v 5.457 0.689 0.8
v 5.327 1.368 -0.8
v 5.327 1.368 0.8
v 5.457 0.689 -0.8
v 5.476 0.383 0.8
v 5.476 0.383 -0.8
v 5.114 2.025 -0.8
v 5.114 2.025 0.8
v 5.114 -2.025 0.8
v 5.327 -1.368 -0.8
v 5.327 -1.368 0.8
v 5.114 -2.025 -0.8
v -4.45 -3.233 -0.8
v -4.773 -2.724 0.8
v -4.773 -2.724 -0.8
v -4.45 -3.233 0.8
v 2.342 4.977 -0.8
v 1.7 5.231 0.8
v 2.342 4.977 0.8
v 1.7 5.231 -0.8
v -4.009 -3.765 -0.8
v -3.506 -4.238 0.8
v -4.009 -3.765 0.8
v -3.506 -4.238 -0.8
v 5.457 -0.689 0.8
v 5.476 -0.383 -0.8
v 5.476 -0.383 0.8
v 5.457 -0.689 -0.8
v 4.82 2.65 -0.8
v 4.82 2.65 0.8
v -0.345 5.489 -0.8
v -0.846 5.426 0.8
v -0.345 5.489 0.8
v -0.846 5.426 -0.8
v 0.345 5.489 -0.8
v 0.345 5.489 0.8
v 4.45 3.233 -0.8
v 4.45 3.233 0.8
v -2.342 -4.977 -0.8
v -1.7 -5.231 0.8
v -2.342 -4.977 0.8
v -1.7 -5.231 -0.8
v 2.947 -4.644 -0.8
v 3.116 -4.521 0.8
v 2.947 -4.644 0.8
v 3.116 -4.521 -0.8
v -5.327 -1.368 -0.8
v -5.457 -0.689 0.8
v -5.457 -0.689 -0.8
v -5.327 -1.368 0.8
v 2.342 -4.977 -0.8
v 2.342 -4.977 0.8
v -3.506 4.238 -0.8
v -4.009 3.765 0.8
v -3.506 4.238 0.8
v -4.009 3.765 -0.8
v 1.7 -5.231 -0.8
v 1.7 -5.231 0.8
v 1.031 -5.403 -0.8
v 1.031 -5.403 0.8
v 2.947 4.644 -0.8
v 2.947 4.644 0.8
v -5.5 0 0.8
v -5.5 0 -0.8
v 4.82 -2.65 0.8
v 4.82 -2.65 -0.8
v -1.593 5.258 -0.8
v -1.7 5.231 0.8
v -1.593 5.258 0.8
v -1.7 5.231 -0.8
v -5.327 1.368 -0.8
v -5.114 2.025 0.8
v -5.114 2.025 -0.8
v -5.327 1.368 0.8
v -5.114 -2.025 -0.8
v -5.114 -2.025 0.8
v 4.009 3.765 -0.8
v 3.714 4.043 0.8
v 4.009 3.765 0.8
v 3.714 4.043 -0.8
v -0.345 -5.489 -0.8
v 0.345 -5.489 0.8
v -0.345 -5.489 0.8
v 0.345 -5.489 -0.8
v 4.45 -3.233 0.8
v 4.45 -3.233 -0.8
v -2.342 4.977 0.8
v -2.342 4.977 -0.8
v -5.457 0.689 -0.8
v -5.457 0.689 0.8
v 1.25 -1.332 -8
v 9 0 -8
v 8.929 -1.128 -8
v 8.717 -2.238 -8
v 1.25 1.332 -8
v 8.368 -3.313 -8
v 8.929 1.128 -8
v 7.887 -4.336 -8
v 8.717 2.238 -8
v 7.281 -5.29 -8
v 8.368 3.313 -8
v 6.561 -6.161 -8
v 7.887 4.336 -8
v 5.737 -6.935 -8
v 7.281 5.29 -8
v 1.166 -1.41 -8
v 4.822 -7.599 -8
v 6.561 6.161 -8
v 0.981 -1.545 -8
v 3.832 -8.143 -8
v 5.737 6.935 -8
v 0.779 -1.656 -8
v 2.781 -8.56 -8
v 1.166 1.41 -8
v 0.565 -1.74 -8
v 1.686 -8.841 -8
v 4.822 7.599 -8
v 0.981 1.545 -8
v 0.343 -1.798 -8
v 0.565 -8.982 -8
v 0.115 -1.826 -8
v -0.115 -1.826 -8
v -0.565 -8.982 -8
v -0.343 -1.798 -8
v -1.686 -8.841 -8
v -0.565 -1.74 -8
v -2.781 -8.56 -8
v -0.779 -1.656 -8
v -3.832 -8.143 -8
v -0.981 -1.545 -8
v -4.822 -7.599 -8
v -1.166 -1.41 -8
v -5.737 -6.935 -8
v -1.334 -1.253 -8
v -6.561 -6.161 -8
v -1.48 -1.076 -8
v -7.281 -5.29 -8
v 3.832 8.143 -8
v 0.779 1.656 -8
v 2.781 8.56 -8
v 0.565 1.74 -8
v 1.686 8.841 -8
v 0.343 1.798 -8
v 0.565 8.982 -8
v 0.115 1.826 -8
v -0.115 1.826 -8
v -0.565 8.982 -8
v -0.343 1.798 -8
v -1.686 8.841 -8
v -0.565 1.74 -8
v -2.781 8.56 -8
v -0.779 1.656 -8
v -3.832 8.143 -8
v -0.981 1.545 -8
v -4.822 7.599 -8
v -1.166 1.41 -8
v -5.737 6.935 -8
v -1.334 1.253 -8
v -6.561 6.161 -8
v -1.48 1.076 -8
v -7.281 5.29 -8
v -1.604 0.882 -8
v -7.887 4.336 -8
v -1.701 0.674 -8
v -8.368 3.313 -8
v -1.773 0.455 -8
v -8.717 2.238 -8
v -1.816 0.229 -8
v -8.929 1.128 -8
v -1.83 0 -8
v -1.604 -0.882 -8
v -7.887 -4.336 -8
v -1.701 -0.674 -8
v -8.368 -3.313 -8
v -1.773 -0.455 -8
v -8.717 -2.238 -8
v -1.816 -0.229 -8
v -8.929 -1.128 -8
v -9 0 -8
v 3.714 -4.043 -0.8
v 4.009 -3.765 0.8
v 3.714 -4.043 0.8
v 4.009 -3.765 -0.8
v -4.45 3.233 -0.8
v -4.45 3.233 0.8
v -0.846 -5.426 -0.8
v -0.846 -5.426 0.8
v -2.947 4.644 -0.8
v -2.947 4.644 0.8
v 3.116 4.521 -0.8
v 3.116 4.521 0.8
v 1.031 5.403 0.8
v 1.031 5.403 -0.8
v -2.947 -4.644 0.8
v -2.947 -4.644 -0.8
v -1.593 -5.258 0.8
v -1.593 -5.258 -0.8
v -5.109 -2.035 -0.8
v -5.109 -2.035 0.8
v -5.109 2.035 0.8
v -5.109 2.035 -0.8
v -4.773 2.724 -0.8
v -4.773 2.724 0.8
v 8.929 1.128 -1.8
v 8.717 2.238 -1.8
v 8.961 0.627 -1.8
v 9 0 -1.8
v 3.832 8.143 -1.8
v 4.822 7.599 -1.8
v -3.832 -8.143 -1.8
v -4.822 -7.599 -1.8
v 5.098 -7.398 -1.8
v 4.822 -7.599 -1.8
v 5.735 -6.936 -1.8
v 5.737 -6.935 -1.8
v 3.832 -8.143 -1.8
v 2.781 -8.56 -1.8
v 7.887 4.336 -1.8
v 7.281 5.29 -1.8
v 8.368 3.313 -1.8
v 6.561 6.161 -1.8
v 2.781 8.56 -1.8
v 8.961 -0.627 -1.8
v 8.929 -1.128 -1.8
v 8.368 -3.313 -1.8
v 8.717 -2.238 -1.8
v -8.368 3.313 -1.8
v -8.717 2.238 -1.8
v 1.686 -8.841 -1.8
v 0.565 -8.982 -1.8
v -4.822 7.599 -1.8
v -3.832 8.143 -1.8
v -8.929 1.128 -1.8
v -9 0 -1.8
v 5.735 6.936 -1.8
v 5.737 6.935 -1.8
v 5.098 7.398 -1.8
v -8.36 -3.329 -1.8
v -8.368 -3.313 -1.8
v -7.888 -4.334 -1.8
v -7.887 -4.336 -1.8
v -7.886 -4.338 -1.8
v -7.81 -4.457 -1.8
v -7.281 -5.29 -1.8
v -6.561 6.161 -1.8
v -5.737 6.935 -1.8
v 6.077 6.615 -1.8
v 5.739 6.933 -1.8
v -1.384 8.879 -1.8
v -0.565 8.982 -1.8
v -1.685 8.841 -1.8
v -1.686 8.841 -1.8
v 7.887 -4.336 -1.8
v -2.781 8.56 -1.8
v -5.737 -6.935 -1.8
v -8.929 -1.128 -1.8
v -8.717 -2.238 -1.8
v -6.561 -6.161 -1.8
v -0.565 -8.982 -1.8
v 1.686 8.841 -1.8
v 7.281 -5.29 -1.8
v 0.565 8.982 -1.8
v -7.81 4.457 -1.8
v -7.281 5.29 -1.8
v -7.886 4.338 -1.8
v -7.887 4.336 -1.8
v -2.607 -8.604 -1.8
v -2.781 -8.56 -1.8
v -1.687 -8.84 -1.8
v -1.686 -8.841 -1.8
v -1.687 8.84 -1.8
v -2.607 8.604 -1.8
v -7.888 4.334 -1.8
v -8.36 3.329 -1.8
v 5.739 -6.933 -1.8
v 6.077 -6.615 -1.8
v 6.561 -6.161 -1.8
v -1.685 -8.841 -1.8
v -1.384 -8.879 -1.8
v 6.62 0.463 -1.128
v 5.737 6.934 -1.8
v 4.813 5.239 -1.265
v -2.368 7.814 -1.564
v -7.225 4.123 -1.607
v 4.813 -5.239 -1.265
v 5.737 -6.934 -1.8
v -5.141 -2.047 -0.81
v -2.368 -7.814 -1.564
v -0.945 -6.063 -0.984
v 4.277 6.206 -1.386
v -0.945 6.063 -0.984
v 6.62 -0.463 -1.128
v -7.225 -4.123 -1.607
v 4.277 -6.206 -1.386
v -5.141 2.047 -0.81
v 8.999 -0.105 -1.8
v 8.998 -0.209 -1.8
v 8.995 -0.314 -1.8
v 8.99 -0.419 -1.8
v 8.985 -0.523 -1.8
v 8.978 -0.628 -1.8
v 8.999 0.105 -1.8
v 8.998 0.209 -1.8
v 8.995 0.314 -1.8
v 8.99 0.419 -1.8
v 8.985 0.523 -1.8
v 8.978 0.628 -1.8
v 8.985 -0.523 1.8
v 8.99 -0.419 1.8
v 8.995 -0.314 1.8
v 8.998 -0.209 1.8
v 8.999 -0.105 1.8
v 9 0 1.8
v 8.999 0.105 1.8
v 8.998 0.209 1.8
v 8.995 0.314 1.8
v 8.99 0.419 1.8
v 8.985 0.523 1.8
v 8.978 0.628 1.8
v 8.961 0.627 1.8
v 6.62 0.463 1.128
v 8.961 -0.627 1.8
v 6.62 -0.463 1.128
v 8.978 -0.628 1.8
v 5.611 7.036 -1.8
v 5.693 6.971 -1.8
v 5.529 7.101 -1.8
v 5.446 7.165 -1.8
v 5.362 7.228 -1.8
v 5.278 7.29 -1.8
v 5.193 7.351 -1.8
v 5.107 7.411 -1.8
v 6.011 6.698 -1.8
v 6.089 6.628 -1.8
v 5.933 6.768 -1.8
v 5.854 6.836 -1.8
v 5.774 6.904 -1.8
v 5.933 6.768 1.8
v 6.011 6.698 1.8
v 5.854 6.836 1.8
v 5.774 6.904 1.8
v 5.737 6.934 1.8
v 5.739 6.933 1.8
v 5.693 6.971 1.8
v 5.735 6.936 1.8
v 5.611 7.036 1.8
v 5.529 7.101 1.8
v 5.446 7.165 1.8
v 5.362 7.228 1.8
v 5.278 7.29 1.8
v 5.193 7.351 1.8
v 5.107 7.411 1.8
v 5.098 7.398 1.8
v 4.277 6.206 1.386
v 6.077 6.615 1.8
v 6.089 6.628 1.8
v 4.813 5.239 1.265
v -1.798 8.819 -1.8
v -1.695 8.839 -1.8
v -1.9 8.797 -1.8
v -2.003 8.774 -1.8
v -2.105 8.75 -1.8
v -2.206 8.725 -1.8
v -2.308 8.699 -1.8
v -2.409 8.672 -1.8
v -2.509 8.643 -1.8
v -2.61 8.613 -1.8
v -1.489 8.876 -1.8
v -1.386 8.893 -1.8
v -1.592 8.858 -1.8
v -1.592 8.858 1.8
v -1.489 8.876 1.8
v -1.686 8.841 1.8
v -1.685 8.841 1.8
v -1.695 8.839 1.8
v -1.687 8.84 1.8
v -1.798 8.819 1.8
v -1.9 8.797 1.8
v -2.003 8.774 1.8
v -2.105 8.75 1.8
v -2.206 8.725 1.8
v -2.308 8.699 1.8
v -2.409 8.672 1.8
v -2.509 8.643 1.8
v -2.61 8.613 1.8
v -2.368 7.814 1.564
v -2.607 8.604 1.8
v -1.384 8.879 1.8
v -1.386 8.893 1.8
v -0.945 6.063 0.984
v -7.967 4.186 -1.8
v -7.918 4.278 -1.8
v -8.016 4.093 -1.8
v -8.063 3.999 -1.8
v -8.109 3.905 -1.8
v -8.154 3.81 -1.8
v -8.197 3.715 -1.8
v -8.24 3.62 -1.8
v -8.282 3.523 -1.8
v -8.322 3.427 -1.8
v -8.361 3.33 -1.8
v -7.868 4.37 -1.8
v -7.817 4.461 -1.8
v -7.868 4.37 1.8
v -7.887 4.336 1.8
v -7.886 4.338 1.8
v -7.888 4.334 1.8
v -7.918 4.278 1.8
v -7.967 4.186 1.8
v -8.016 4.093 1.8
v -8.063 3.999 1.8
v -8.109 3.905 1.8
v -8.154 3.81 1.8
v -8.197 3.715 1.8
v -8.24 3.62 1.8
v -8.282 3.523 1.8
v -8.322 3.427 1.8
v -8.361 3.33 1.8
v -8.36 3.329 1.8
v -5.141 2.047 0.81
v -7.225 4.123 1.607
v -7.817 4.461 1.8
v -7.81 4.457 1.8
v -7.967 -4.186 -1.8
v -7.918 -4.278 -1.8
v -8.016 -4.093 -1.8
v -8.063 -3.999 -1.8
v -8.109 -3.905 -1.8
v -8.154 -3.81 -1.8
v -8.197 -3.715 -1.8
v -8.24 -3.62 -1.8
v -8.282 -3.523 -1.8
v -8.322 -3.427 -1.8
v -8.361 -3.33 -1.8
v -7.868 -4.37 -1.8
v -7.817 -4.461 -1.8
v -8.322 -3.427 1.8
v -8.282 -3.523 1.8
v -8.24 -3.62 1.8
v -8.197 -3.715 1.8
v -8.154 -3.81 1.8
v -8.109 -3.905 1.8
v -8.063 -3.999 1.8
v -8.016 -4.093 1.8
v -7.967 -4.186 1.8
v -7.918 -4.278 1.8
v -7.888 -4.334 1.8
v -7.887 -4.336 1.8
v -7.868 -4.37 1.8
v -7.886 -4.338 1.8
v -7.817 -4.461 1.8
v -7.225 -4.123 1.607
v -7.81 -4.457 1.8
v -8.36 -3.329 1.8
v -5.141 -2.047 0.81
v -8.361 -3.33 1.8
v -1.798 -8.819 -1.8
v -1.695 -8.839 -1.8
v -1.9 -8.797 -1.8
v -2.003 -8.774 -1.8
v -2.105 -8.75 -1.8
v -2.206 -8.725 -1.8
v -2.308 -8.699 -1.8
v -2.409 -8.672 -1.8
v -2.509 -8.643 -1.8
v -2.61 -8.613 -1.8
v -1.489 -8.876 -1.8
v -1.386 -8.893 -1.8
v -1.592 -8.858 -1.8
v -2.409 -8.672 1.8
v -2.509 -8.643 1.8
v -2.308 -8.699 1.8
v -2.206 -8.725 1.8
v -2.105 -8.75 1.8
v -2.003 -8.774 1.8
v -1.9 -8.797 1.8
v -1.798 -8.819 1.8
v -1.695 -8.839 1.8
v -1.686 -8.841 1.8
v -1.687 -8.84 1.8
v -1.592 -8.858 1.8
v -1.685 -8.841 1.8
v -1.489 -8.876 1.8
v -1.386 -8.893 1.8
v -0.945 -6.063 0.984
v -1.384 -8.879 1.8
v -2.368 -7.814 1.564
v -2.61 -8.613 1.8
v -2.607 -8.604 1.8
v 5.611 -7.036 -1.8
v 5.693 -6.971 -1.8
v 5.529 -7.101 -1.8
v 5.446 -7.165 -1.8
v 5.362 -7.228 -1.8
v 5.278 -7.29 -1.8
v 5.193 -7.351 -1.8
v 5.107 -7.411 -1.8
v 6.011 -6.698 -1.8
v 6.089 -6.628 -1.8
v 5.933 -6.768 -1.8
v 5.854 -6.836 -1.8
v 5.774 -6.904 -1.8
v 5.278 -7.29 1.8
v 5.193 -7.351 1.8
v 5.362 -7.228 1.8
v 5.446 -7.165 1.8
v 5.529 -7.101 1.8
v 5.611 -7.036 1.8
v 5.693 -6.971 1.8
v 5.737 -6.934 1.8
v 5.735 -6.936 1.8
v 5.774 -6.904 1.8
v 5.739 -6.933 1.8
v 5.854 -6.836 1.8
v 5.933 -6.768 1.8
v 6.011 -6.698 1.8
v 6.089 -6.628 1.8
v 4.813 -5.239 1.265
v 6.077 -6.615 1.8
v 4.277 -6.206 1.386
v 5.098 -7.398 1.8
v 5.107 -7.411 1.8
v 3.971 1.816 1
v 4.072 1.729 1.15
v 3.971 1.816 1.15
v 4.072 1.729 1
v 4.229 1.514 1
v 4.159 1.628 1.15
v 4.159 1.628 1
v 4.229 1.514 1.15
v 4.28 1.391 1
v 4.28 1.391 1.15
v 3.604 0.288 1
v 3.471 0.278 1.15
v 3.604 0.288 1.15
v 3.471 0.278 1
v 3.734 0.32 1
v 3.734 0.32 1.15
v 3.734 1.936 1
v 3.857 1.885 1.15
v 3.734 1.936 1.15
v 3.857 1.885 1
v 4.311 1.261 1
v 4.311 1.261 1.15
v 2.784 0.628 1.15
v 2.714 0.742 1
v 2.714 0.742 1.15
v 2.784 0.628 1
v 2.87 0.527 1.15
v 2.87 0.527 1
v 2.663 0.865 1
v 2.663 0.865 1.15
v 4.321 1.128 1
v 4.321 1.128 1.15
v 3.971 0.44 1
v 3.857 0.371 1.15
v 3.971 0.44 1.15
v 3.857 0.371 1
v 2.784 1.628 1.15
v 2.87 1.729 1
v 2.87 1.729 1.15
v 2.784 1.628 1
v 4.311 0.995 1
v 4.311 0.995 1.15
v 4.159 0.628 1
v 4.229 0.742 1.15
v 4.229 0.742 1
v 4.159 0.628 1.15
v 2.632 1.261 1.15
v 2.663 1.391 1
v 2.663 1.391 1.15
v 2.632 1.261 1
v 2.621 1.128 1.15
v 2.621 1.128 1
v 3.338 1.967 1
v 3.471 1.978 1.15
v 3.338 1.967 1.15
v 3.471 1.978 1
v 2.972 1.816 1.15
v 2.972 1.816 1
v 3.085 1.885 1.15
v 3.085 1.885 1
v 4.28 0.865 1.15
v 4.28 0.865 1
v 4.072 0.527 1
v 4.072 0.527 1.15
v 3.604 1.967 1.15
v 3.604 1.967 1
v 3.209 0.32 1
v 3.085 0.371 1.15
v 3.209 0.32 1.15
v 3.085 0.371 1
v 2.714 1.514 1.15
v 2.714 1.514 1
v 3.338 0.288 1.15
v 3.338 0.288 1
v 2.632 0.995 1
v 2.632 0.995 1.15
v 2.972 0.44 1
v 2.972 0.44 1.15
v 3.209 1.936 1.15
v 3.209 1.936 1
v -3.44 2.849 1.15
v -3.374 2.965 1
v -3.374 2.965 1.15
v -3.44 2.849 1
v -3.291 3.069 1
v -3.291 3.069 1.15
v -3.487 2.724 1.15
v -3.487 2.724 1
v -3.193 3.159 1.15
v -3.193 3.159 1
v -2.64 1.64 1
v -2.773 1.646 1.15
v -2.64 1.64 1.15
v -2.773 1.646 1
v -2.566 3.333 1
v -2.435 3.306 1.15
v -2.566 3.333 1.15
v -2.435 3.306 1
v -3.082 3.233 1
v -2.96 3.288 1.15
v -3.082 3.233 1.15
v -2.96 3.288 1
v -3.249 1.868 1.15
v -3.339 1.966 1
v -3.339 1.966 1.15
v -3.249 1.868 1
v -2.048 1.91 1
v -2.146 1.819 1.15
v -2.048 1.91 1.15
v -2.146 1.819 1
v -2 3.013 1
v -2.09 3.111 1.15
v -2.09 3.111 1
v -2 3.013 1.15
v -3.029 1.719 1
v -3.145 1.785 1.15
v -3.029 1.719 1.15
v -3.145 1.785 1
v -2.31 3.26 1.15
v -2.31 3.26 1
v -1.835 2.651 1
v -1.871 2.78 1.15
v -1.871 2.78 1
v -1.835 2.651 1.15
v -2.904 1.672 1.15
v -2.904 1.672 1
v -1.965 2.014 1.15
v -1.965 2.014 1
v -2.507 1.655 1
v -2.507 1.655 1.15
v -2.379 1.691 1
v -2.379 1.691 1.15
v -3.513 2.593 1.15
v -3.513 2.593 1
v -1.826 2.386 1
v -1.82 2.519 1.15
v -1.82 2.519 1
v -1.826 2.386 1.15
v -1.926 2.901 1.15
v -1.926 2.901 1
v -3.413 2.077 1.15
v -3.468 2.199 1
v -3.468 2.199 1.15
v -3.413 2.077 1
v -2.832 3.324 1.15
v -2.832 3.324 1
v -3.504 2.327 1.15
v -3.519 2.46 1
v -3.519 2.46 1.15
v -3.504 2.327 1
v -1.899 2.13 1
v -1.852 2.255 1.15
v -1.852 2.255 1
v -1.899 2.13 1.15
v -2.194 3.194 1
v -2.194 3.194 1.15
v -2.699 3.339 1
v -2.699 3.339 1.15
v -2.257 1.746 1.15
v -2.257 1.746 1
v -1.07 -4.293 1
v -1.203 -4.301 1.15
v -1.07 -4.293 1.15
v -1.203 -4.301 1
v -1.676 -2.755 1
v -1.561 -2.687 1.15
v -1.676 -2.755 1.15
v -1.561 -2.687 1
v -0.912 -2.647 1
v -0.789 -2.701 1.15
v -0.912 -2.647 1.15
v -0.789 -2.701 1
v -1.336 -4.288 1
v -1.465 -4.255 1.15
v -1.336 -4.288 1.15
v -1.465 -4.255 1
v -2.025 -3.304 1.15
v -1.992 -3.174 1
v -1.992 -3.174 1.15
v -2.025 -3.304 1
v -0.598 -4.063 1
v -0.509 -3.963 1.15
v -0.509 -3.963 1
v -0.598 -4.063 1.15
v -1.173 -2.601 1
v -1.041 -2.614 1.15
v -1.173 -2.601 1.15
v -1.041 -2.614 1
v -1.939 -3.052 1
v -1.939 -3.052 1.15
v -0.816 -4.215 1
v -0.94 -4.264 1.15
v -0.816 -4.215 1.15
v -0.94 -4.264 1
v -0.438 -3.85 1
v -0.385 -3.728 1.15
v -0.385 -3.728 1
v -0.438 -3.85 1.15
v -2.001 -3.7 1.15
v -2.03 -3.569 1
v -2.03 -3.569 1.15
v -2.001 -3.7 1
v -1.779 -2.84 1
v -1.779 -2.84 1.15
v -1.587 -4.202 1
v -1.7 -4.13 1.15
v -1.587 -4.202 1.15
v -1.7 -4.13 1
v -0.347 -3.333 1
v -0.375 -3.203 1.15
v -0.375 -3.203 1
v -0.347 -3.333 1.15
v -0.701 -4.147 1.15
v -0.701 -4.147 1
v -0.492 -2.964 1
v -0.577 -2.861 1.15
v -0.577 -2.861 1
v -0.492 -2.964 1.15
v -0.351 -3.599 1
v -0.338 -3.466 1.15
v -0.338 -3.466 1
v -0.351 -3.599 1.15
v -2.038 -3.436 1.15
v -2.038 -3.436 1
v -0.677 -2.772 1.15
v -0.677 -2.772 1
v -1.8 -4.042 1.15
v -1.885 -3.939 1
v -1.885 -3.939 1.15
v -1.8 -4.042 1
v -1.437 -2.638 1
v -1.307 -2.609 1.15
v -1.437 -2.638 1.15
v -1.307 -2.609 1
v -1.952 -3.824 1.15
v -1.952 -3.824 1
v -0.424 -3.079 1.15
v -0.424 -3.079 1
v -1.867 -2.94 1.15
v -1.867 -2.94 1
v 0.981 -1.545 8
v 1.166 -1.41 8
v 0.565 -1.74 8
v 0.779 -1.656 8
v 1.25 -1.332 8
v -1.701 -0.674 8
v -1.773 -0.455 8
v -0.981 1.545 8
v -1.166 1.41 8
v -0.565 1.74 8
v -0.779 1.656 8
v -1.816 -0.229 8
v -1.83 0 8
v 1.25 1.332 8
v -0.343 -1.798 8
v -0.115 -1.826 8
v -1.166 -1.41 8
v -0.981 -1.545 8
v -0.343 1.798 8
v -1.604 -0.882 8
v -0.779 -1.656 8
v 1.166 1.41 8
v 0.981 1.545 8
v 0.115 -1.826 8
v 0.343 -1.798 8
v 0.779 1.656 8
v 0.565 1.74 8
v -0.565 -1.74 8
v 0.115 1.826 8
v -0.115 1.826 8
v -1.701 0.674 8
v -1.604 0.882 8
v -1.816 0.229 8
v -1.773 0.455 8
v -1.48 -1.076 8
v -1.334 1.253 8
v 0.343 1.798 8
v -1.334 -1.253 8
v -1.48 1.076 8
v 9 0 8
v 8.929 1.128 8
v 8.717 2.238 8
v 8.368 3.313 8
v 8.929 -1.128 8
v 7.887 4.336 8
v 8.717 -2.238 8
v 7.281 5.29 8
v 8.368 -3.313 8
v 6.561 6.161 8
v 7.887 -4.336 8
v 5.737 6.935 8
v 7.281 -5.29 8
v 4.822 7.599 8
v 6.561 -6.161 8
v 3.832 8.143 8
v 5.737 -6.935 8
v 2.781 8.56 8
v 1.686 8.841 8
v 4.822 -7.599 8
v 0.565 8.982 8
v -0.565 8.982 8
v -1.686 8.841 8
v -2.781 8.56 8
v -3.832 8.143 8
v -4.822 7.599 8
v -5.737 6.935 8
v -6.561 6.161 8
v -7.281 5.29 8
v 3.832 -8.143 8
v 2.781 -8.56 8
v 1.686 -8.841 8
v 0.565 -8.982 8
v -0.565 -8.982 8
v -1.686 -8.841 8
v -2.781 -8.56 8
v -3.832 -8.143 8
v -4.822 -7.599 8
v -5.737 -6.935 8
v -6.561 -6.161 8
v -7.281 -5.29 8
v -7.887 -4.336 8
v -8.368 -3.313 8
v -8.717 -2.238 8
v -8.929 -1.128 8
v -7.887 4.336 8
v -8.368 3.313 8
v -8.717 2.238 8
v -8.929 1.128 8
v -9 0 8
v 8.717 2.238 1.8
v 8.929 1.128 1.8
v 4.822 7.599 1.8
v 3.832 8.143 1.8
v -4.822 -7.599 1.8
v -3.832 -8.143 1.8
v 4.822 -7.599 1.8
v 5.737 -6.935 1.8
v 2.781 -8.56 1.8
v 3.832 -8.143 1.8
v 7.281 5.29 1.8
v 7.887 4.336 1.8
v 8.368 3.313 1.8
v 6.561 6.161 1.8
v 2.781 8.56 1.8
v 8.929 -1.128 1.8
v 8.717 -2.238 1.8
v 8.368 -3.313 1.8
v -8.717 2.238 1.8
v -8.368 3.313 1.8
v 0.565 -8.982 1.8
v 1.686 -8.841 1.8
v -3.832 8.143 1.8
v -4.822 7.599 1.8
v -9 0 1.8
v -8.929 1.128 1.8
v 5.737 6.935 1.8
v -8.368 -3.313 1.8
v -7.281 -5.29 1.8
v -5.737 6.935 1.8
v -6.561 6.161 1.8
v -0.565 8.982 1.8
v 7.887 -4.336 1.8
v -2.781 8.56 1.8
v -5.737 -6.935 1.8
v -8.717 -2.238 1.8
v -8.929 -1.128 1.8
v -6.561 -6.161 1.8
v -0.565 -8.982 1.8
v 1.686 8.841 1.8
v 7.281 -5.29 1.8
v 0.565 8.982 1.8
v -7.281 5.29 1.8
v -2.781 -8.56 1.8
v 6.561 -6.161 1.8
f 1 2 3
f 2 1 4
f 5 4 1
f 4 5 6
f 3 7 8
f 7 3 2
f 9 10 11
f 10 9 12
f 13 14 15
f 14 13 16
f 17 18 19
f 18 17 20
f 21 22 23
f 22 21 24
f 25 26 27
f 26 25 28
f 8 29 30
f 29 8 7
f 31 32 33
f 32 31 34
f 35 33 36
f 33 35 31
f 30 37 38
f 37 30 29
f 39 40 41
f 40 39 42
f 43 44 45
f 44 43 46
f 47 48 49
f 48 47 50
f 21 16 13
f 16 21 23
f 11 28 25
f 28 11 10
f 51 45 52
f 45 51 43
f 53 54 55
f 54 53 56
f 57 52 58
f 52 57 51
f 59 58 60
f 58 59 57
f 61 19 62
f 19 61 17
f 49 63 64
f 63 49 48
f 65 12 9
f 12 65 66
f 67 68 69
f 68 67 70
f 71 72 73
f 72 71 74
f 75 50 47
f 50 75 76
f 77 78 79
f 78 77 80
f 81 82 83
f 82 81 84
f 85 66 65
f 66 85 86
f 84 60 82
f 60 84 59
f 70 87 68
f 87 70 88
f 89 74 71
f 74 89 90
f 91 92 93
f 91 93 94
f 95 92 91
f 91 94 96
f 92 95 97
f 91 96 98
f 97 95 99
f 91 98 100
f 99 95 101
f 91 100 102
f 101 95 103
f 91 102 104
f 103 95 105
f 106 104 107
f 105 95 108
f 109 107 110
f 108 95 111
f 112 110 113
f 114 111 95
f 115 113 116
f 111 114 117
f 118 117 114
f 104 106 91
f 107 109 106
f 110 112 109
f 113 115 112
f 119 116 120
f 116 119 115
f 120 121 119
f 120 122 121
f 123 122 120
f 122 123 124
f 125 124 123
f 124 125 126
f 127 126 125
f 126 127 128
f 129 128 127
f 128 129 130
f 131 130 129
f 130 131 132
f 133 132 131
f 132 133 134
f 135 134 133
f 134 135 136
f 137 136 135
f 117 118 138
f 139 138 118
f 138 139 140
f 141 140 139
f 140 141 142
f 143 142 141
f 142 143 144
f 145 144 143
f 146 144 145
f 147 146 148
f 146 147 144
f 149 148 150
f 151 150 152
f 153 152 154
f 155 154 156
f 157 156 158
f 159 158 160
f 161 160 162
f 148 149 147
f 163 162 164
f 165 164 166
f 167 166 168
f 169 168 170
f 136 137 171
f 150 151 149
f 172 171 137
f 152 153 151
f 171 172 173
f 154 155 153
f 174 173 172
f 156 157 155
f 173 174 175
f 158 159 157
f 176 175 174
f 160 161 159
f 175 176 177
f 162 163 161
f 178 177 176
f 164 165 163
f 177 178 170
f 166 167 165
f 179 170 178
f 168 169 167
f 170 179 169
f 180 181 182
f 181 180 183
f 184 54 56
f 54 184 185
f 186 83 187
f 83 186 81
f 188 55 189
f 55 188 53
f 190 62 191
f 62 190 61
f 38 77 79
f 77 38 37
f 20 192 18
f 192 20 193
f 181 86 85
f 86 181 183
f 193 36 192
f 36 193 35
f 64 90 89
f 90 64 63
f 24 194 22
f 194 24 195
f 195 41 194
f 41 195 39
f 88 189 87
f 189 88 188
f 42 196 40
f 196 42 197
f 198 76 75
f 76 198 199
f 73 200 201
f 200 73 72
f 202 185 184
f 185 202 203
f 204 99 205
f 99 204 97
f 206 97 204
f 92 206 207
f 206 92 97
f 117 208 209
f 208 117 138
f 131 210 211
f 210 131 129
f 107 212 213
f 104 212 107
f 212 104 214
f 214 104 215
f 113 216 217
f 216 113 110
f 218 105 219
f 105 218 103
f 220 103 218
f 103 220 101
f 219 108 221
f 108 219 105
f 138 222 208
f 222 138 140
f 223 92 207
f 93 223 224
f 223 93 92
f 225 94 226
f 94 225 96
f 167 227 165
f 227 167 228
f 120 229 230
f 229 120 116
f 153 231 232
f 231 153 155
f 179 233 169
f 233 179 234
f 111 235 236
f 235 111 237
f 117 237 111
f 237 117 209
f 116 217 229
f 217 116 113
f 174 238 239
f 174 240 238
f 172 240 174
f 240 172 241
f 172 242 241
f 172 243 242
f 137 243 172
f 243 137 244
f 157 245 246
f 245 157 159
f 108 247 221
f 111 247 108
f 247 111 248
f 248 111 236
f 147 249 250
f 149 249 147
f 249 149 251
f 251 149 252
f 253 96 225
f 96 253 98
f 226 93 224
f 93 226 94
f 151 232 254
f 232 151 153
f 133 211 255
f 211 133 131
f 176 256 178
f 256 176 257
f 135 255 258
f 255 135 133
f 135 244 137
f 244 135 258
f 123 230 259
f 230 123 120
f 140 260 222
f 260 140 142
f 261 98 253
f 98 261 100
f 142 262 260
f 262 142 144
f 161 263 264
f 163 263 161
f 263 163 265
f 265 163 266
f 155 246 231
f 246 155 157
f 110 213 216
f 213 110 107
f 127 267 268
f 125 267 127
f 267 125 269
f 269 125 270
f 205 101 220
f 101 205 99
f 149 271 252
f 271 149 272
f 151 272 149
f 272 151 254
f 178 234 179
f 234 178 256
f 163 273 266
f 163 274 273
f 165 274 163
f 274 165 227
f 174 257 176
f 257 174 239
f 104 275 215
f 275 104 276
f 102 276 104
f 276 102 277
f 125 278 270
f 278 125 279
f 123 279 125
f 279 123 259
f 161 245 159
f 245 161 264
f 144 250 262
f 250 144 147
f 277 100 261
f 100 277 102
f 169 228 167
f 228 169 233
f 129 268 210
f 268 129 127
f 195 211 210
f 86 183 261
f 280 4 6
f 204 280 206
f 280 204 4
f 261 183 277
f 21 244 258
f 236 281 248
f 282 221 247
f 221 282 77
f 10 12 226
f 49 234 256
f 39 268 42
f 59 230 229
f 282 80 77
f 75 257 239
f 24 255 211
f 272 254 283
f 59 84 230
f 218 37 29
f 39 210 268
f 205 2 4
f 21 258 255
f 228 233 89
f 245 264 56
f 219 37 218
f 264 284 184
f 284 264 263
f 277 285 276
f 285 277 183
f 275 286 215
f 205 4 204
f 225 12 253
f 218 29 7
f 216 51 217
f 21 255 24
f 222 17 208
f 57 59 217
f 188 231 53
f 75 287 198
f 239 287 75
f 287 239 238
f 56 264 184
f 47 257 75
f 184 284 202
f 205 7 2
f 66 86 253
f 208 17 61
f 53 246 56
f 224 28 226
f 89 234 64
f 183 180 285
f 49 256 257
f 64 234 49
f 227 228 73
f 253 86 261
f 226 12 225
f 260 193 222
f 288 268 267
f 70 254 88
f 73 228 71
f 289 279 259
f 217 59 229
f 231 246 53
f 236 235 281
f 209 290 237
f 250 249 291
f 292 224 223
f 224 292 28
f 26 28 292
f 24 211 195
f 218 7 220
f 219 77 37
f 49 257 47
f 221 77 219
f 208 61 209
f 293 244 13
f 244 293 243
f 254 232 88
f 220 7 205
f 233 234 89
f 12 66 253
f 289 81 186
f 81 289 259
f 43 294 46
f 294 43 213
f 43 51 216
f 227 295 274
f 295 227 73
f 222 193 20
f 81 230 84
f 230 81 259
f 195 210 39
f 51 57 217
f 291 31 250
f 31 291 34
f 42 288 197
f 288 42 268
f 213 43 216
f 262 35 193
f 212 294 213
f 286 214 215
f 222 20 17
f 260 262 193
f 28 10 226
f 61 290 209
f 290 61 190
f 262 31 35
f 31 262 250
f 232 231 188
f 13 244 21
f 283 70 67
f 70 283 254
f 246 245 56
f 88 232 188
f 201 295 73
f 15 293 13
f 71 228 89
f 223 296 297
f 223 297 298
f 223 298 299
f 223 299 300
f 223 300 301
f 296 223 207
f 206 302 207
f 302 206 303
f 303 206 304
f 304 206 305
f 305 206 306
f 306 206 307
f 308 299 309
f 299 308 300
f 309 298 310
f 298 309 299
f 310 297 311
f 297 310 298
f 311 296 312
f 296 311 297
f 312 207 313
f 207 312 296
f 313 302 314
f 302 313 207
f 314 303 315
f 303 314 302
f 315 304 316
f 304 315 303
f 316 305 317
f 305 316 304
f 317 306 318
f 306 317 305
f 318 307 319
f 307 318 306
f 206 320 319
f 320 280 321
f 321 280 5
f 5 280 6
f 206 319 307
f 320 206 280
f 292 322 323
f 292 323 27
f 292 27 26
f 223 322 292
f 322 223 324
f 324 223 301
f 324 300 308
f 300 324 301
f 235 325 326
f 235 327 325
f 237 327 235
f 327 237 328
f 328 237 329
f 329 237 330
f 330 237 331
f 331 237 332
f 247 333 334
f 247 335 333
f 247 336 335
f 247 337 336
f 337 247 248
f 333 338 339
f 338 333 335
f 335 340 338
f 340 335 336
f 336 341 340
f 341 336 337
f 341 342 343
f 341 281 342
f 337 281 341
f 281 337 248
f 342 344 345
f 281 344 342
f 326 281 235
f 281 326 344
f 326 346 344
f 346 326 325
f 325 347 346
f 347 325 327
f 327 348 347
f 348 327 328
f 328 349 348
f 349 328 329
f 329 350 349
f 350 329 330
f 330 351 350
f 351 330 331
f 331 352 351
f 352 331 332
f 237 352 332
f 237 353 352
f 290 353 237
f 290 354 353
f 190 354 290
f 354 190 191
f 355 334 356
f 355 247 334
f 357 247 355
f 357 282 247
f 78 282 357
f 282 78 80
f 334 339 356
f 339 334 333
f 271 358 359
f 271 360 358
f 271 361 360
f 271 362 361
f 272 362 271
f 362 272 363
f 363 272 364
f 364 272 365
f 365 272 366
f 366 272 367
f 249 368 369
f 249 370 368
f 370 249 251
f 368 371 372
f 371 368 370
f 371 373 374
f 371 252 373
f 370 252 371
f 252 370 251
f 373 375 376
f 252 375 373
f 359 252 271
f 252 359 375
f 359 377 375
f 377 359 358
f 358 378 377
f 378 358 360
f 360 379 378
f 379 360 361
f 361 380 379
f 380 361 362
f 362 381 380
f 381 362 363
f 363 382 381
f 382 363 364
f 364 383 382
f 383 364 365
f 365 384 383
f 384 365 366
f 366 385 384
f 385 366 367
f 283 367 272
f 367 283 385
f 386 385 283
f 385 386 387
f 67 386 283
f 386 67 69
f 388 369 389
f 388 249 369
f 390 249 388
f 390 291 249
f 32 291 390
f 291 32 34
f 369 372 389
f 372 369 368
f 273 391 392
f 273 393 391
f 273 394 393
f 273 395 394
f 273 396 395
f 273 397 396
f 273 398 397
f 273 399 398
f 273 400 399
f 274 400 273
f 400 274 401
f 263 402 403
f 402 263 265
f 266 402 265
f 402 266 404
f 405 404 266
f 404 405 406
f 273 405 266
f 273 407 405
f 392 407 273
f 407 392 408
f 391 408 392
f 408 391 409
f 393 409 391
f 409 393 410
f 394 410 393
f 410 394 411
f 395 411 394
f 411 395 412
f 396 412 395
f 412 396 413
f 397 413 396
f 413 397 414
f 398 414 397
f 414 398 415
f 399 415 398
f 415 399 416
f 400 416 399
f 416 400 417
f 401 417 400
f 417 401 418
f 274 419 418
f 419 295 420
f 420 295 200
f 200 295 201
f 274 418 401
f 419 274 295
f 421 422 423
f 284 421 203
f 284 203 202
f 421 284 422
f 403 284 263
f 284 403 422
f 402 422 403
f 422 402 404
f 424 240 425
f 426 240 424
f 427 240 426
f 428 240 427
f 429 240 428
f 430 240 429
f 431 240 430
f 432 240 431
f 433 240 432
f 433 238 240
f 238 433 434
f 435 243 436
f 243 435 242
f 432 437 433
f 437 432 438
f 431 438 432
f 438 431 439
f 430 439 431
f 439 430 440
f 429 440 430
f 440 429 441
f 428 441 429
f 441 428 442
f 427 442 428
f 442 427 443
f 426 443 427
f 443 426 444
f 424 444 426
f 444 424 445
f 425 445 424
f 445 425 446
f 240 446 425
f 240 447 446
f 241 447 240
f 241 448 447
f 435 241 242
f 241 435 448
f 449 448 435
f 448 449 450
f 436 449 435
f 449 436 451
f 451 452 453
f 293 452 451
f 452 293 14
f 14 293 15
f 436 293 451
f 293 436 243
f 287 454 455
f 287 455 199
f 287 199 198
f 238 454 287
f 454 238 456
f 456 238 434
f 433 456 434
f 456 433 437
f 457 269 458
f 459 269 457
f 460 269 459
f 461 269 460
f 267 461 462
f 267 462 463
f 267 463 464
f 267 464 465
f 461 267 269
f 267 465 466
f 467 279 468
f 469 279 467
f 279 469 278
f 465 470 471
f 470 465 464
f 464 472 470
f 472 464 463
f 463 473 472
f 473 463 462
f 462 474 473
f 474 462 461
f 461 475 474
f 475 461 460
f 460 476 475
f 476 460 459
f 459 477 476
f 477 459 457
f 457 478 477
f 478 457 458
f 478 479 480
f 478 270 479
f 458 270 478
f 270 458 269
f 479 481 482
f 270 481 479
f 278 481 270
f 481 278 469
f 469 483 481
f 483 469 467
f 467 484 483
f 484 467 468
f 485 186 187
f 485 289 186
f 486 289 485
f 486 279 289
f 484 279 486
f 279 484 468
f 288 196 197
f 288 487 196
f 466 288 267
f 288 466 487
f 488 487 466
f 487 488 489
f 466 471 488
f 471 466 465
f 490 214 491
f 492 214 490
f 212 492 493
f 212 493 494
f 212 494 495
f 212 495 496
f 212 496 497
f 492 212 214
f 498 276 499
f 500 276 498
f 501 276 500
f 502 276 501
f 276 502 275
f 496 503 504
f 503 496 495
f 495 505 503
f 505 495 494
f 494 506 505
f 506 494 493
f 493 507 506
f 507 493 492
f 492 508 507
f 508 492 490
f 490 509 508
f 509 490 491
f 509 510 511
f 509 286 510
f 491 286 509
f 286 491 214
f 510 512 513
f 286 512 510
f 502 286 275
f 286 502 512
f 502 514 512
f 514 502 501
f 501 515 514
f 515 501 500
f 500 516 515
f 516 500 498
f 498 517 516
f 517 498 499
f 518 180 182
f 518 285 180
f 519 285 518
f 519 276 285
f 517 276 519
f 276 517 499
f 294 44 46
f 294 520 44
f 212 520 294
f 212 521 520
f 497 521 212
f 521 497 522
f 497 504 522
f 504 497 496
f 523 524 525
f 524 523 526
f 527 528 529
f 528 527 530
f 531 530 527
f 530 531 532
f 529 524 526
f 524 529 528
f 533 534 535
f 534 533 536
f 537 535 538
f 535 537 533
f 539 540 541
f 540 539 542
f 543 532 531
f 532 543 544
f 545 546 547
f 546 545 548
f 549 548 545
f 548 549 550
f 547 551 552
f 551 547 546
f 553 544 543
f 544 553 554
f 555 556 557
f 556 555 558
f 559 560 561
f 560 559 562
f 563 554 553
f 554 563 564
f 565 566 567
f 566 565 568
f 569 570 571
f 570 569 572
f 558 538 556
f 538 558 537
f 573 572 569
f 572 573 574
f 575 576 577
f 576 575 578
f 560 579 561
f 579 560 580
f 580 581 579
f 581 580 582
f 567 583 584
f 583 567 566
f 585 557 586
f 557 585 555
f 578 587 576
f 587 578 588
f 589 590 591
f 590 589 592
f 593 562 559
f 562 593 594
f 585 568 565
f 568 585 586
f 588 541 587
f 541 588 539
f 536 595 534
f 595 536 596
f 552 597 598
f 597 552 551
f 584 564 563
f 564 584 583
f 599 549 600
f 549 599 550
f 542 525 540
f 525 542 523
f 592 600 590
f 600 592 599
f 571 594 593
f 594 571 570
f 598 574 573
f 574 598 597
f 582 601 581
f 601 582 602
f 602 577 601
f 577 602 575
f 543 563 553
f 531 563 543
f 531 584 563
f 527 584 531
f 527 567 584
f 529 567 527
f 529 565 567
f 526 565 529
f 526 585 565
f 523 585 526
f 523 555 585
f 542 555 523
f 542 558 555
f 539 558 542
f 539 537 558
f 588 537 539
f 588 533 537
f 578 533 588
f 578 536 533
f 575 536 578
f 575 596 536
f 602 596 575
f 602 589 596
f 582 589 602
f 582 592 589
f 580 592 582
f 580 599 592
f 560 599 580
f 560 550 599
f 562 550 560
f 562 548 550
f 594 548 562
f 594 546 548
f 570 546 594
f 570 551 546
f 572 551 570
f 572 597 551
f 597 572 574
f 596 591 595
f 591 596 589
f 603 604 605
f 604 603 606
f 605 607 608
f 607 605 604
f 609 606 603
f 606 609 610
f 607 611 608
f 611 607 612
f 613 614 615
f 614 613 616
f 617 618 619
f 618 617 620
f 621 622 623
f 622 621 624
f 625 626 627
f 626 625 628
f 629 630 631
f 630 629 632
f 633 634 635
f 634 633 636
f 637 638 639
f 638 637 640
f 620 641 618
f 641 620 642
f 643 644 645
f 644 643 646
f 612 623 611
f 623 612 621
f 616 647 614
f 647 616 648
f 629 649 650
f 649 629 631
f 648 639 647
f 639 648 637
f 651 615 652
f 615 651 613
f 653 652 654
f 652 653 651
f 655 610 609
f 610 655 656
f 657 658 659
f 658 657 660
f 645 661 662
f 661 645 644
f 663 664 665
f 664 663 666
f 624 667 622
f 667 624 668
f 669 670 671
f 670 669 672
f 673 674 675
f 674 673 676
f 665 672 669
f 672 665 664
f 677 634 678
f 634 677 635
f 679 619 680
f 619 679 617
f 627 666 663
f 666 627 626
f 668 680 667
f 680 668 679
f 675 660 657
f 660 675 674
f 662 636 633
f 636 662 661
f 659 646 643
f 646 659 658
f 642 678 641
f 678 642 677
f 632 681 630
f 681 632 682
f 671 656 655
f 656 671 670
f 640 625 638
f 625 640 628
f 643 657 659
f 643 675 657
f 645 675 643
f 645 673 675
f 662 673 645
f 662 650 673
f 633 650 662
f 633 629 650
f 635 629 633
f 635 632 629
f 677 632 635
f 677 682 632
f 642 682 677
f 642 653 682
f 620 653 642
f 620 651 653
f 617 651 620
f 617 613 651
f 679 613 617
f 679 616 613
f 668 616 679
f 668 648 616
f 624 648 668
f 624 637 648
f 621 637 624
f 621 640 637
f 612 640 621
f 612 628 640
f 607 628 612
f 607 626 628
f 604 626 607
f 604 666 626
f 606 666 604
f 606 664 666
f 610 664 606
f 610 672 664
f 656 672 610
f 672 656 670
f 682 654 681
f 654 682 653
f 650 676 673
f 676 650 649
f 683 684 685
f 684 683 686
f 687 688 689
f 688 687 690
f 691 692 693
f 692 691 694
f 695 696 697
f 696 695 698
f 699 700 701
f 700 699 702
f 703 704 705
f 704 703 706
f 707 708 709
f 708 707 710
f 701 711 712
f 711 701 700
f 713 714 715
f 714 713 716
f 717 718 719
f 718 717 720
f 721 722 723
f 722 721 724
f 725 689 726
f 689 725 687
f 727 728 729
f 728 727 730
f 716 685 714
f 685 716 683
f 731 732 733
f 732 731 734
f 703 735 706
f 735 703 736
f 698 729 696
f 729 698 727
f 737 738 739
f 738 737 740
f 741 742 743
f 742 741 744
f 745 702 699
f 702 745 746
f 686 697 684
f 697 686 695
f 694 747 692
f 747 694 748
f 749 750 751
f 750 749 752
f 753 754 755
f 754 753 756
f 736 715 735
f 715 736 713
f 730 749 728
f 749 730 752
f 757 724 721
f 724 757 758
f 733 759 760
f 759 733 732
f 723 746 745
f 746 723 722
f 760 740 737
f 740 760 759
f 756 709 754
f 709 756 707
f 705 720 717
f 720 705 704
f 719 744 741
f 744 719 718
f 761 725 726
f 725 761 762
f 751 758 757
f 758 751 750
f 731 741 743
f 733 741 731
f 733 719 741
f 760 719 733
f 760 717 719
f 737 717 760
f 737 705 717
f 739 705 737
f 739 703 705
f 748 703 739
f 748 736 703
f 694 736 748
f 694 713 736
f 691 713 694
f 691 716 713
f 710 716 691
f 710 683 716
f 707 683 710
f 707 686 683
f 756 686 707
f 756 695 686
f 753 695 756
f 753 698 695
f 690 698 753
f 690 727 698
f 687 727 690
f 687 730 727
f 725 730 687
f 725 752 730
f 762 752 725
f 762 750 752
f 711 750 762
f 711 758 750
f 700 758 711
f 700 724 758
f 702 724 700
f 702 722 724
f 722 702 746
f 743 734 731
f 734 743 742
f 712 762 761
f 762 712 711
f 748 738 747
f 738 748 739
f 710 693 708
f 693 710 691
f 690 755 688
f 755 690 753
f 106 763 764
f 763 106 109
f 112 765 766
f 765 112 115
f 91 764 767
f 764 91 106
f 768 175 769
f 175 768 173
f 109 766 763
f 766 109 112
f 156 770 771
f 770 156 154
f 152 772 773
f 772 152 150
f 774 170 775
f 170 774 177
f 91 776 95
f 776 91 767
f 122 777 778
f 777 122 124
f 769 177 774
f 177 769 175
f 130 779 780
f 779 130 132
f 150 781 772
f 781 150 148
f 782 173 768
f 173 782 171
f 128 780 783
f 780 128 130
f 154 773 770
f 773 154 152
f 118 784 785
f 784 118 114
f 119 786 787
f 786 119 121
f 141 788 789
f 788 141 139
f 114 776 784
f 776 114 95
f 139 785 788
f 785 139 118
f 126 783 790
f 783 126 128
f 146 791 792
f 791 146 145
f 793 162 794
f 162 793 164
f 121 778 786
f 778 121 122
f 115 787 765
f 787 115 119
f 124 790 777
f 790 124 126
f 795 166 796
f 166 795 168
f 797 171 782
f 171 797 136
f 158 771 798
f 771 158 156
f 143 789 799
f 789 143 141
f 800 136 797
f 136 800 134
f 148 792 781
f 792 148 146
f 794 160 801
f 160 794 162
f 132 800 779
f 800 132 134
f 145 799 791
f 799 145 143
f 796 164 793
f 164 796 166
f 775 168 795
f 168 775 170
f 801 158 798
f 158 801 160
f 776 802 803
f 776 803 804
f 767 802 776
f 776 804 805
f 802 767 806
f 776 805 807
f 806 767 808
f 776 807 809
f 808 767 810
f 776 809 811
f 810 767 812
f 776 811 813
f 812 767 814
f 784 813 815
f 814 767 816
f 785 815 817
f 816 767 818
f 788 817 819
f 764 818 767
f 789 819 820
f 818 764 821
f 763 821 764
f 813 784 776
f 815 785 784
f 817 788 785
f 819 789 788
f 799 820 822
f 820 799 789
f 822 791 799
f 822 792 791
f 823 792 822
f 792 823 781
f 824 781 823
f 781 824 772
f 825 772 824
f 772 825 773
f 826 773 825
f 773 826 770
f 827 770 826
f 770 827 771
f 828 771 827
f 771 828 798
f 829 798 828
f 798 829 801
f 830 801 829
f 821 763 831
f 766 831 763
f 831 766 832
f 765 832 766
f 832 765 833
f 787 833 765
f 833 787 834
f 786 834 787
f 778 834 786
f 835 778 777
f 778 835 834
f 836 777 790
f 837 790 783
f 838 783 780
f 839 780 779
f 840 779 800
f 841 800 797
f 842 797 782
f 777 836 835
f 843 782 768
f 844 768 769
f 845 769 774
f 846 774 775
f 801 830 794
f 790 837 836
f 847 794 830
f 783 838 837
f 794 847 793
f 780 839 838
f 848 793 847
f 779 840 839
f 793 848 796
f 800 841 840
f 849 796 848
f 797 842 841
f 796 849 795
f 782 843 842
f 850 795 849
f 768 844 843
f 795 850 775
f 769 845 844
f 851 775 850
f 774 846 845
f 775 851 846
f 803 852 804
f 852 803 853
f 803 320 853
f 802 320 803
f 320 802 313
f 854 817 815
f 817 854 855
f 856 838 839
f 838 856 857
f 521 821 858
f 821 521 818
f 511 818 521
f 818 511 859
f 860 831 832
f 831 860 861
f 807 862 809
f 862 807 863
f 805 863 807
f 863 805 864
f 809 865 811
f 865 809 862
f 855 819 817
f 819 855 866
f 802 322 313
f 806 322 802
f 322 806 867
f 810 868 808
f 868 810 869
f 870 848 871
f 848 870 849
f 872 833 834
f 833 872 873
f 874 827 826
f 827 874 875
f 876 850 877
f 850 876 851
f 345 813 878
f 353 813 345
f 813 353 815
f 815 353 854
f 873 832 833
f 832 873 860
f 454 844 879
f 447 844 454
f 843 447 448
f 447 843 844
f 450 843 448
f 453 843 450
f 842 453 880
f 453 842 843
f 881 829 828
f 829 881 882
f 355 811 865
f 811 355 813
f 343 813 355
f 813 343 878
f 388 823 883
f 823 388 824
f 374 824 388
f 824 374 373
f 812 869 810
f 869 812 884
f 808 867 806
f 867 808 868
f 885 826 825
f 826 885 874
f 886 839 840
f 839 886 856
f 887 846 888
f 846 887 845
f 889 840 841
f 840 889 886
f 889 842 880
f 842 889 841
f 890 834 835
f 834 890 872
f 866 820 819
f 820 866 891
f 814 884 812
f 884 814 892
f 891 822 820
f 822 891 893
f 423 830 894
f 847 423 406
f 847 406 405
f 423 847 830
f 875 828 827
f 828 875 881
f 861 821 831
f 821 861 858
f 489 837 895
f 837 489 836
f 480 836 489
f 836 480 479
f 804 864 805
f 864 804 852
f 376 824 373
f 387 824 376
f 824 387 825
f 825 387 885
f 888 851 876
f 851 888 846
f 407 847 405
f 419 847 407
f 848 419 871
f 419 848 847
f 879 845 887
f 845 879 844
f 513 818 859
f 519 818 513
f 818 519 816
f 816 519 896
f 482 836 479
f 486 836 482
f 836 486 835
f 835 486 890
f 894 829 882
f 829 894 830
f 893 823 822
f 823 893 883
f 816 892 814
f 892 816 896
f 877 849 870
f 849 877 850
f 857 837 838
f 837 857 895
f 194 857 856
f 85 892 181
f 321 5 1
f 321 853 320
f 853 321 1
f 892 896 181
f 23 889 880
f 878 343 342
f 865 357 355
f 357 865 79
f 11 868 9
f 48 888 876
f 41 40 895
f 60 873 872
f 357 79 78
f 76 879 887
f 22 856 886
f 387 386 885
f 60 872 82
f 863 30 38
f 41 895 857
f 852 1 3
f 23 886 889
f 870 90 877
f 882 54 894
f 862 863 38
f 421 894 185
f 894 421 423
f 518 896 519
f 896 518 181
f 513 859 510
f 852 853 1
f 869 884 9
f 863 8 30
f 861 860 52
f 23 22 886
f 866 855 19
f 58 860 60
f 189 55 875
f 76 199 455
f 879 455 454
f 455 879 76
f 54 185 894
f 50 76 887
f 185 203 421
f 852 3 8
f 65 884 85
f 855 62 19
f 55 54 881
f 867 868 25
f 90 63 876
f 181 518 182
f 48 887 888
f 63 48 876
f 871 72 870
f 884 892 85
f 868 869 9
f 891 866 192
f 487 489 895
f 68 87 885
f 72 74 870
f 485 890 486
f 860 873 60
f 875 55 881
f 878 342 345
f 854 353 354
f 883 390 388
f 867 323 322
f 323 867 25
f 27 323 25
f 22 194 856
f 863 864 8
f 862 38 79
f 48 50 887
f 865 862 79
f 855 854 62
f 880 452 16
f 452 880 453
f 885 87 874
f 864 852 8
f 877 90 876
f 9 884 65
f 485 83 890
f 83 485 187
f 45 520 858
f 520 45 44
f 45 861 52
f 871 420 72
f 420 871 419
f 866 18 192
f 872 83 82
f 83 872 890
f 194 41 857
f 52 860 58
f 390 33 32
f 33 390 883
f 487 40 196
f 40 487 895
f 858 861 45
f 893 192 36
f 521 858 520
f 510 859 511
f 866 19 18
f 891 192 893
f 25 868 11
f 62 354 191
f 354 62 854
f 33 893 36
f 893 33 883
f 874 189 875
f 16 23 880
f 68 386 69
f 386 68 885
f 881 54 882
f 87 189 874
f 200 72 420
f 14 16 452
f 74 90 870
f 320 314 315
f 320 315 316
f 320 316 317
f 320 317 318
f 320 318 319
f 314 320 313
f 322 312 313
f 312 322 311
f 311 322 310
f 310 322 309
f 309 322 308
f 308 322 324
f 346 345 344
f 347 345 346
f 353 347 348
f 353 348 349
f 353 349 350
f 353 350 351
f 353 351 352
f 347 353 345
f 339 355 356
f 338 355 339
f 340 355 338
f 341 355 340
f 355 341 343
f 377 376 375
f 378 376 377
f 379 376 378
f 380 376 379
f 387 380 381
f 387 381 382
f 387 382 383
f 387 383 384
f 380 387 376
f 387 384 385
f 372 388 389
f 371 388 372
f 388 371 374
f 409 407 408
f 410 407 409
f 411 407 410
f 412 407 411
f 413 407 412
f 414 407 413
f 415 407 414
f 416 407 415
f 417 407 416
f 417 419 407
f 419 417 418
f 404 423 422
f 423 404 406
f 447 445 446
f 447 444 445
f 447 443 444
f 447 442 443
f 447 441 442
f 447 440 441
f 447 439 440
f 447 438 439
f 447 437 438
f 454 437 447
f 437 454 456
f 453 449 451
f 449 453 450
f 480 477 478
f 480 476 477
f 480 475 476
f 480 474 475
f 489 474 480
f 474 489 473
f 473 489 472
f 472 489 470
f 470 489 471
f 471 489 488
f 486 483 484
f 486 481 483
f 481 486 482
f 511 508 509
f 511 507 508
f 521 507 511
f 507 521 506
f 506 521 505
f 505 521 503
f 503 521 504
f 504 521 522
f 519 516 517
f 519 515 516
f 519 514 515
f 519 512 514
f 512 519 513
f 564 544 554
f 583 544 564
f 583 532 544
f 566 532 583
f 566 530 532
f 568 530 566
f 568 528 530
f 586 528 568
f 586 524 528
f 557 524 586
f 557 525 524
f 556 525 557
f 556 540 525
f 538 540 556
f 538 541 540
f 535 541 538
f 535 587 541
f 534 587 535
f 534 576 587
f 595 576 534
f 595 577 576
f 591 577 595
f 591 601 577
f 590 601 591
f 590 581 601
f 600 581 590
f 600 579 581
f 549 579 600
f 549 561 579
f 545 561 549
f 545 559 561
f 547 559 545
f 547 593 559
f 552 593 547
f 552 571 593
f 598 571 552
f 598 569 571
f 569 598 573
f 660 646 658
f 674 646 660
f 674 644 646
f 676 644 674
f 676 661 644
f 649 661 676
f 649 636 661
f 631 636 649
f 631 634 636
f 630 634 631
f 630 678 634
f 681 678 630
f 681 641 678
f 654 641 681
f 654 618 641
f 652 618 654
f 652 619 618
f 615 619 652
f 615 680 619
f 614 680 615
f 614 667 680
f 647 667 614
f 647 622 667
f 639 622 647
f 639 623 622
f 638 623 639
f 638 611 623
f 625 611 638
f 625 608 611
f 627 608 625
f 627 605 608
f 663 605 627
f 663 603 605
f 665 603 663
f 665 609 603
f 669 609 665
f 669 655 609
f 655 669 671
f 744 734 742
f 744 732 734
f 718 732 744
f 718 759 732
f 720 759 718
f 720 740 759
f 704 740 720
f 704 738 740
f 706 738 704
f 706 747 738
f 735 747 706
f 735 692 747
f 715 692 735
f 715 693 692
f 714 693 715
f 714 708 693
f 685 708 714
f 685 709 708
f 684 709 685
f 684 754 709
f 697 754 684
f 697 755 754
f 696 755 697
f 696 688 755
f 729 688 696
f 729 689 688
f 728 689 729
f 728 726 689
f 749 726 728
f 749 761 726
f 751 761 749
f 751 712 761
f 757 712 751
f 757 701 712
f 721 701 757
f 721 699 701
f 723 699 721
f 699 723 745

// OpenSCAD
/*
  Parametric drive wheel / sprocket for LEGO rubber tread x939 / 43903
  -------------------------------------------------------------------
  Designed from the public LDraw geometry for 43903 and 55982:
    - track width: ~13.6 mm
    - supported wheel radius: ~8.4 mm (16.8 mm OD)
    - internal guide/drive lug: ~2.4 mm max axial width
    - lug projects inward to ~5.9 mm radius when wrapped around the wheel
    - 8 lug positions around a full wheel turn (45 deg pitch)

  The wheel is split axially at the center groove so both halves print flat,
  support-free.  The center groove clears the track's internal lugs, while
  8 small teeth in that groove sit between lugs and provide positive drive.

  Default 3 mm D-shaft assumption:
    round diameter = 3.0 mm
    flat depth     = 0.50 mm  -> 2.50 mm across the D before clearance

  Select output with `part`:
    "male"      = half with alignment pegs
    "female"    = half with alignment holes
    "both"      = both halves laid out for printing
    "assembly"  = assembled preview
    "coupon"    = small D-shaft fit-test coupon
*/

part = "assembly"; // [male,female,both,assembly,coupon]
idler = false;  // D-shaft or round shaft

// ---------- Track / wheel geometry ----------
wheel_radius       = 9;  // 18 mm OD;
wheel_width        = 16;
groove_width       = 3.6;
groove_root_width  = 2.0;
groove_root_radius = 5.50;  // below ~5.9 mm lug-tip radius, with clearance

// Positive-drive teeth in the center groove.
tooth_count        = 7;
tooth_outer_radius = wheel_radius;
tooth_angle        = 8.0;  // track lug gap is roughly 23 deg in the formed LDraw model
tooth_axial_total  = groove_width;
tooth_phase        = 0;

// ---------- Shaft ----------
shaft_d            = 3.50;
shaft_flat_depth   = 0.60;  // 3.0 mm round with 0.5 mm flat -> 2.5 mm D height
shaft_clearance    = 0.08;  // XY clearance per side; tune for your printer/material

// ---------- Half registration ----------
alignment_pins     = true;
peg_d              = 1.70;
peg_length         = 1.00;
peg_hole_clearance = 0.0;  // diametral clearance
peg_radius         = 3.65;
peg_angles         = [18, 137, 251]; // intentionally asymmetric so halves index uniquely

// ---------- Print / tessellation ----------
$fn = 50;
eps = 0.02;

half_width  = wheel_width/2;
groove_half = groove_width/2;
groove_root_half = groove_root_width/2;
tooth_half  = tooth_axial_total/2;

assert(groove_width < wheel_width, "groove_width must be less than wheel_width");
assert(groove_root_radius < tooth_outer_radius, "tooth_outer_radius must exceed groove_root_radius");
assert(tooth_outer_radius <= wheel_radius, "teeth should not exceed support rail radius");
assert(tooth_axial_total <= groove_width, "tooth_axial_total must fit inside groove_width");
assert(peg_radius + (peg_d + peg_hole_clearance)/2 < groove_root_radius,
       "alignment pins must fit inside the center hub/core");

// D-profile: flat is on +X.  For a 3 mm shaft with 0.5 mm flat depth,
// the un-cleared flat lies at x = +1.0 mm from shaft center.
module d_profile_2d() {
    bore_r = shaft_d/2 + shaft_clearance;
    flat_x = shaft_d/2 - shaft_flat_depth + shaft_clearance;
    intersection() {
        circle(r=bore_r);
        translate([-bore_r-eps, -bore_r-eps])
            square([bore_r + flat_x + 2*eps, 2*bore_r + 2*eps]);
    }
}

module d_bore(h) {
    translate([0,0,-eps])
        linear_extrude(height=h + 2*eps)
            d_profile_2d();
}

module bore(h) {
  translate([0, 0, -eps])
    linear_extrude(height=h + 2*eps)
      circle(r=shaft_d/2 + shaft_clearance);
}

// Annular sector for one drive tooth.
module annular_sector(r1, r2, angle, h, steps=12) {
    a0 = -angle/2;
    a1 =  angle/2;
    pts_outer = [for (i=[0:steps])
        let(a=a0 + (a1-a0)*i/steps)
            [r2*cos(a), r2*sin(a)]];
    pts_inner = [for (i=[steps:-1:0])
        let(a=a0 + (a1-a0)*i/steps)
            [r1*cos(a), r1*sin(a)]];
    linear_extrude(height=h)
        polygon(concat(pts_outer, pts_inner));
}

module relieved_half_body() {
    union() {
      cylinder(r=groove_root_radius, h=half_width);
      cylinder(r=wheel_radius, h=half_width-groove_half);
      translate([0, 0, half_width-groove_half])
      cylinder(r1=wheel_radius, r2=groove_root_radius, h=groove_root_half);
    }
}

module drive_teeth() {
    for (i=[0:tooth_count-1])
        rotate([0,0,tooth_phase + i*360/tooth_count])
            translate([0,0,half_width-groove_half])
                annular_sector(
                    groove_root_radius-eps,
                    tooth_outer_radius,
                    tooth_angle,
                    tooth_half+eps
                );
}

module male_pegs() {
    if (alignment_pins)
        for (a=peg_angles)
            rotate([0,0,a])
                translate([peg_radius,0,half_width-eps])
                    cylinder(d=peg_d, h=peg_length+eps, $fn=40);
}

module female_peg_holes() {
    if (alignment_pins)
        for (a=peg_angles)
            rotate([0,0,a])
                translate([peg_radius,0,half_width-peg_length-0.15])
                    cylinder(d=peg_d+peg_hole_clearance,
                             h=peg_length+0.20+eps, $fn=40);
}

module wheel_half(male=true) {
    difference() {
        union() {
            relieved_half_body();
            drive_teeth();
            if (male) male_pegs();
        }

        if(idler) {
          bore(half_width + (male ? peg_length : 0));
        } else {
          d_bore(half_width + (male ? peg_length : 0));
        }
        if (!male) female_peg_holes();
    }
}

// Printable orientation: broad outside face is flat on the bed, mating face up.
module printable_male()   { wheel_half(true); }
module printable_female() { wheel_half(false); }

module assembled() {
    // Male half: outer face at -half_width, mating face at z=0, pegs +Z.
    color([0.80,0.80,0.84])
        translate([0,0,-half_width]) printable_male();

    // Female half mirrored so its mating face is also at z=0.
    color([0.55,0.58,0.62])
        mirror([0,0,1])
            translate([0,0,-half_width]) printable_female();
}

module shaft_coupon() {
    // Fast print for dialing in shaft_clearance before committing to the wheel.
    difference() {
        hull() {
            translate([-4,0,0]) cylinder(d=8, h=4, $fn=48);
            translate([ 4,0,0]) cylinder(d=8, h=4, $fn=48);
        }
        translate([0,0,0]) d_bore(4);
    }
}

if (part == "male") {
    printable_male();
} else if (part == "female") {
    printable_female();
} else if (part == "both") {
    translate([-10,0,0]) printable_male();
    translate([ 10,0,0]) printable_female();
} else if (part == "assembly") {
    assembled();
} else if (part == "coupon") {
    shaft_coupon();
} else {
    echo("Unknown part selector: ", part);
}
